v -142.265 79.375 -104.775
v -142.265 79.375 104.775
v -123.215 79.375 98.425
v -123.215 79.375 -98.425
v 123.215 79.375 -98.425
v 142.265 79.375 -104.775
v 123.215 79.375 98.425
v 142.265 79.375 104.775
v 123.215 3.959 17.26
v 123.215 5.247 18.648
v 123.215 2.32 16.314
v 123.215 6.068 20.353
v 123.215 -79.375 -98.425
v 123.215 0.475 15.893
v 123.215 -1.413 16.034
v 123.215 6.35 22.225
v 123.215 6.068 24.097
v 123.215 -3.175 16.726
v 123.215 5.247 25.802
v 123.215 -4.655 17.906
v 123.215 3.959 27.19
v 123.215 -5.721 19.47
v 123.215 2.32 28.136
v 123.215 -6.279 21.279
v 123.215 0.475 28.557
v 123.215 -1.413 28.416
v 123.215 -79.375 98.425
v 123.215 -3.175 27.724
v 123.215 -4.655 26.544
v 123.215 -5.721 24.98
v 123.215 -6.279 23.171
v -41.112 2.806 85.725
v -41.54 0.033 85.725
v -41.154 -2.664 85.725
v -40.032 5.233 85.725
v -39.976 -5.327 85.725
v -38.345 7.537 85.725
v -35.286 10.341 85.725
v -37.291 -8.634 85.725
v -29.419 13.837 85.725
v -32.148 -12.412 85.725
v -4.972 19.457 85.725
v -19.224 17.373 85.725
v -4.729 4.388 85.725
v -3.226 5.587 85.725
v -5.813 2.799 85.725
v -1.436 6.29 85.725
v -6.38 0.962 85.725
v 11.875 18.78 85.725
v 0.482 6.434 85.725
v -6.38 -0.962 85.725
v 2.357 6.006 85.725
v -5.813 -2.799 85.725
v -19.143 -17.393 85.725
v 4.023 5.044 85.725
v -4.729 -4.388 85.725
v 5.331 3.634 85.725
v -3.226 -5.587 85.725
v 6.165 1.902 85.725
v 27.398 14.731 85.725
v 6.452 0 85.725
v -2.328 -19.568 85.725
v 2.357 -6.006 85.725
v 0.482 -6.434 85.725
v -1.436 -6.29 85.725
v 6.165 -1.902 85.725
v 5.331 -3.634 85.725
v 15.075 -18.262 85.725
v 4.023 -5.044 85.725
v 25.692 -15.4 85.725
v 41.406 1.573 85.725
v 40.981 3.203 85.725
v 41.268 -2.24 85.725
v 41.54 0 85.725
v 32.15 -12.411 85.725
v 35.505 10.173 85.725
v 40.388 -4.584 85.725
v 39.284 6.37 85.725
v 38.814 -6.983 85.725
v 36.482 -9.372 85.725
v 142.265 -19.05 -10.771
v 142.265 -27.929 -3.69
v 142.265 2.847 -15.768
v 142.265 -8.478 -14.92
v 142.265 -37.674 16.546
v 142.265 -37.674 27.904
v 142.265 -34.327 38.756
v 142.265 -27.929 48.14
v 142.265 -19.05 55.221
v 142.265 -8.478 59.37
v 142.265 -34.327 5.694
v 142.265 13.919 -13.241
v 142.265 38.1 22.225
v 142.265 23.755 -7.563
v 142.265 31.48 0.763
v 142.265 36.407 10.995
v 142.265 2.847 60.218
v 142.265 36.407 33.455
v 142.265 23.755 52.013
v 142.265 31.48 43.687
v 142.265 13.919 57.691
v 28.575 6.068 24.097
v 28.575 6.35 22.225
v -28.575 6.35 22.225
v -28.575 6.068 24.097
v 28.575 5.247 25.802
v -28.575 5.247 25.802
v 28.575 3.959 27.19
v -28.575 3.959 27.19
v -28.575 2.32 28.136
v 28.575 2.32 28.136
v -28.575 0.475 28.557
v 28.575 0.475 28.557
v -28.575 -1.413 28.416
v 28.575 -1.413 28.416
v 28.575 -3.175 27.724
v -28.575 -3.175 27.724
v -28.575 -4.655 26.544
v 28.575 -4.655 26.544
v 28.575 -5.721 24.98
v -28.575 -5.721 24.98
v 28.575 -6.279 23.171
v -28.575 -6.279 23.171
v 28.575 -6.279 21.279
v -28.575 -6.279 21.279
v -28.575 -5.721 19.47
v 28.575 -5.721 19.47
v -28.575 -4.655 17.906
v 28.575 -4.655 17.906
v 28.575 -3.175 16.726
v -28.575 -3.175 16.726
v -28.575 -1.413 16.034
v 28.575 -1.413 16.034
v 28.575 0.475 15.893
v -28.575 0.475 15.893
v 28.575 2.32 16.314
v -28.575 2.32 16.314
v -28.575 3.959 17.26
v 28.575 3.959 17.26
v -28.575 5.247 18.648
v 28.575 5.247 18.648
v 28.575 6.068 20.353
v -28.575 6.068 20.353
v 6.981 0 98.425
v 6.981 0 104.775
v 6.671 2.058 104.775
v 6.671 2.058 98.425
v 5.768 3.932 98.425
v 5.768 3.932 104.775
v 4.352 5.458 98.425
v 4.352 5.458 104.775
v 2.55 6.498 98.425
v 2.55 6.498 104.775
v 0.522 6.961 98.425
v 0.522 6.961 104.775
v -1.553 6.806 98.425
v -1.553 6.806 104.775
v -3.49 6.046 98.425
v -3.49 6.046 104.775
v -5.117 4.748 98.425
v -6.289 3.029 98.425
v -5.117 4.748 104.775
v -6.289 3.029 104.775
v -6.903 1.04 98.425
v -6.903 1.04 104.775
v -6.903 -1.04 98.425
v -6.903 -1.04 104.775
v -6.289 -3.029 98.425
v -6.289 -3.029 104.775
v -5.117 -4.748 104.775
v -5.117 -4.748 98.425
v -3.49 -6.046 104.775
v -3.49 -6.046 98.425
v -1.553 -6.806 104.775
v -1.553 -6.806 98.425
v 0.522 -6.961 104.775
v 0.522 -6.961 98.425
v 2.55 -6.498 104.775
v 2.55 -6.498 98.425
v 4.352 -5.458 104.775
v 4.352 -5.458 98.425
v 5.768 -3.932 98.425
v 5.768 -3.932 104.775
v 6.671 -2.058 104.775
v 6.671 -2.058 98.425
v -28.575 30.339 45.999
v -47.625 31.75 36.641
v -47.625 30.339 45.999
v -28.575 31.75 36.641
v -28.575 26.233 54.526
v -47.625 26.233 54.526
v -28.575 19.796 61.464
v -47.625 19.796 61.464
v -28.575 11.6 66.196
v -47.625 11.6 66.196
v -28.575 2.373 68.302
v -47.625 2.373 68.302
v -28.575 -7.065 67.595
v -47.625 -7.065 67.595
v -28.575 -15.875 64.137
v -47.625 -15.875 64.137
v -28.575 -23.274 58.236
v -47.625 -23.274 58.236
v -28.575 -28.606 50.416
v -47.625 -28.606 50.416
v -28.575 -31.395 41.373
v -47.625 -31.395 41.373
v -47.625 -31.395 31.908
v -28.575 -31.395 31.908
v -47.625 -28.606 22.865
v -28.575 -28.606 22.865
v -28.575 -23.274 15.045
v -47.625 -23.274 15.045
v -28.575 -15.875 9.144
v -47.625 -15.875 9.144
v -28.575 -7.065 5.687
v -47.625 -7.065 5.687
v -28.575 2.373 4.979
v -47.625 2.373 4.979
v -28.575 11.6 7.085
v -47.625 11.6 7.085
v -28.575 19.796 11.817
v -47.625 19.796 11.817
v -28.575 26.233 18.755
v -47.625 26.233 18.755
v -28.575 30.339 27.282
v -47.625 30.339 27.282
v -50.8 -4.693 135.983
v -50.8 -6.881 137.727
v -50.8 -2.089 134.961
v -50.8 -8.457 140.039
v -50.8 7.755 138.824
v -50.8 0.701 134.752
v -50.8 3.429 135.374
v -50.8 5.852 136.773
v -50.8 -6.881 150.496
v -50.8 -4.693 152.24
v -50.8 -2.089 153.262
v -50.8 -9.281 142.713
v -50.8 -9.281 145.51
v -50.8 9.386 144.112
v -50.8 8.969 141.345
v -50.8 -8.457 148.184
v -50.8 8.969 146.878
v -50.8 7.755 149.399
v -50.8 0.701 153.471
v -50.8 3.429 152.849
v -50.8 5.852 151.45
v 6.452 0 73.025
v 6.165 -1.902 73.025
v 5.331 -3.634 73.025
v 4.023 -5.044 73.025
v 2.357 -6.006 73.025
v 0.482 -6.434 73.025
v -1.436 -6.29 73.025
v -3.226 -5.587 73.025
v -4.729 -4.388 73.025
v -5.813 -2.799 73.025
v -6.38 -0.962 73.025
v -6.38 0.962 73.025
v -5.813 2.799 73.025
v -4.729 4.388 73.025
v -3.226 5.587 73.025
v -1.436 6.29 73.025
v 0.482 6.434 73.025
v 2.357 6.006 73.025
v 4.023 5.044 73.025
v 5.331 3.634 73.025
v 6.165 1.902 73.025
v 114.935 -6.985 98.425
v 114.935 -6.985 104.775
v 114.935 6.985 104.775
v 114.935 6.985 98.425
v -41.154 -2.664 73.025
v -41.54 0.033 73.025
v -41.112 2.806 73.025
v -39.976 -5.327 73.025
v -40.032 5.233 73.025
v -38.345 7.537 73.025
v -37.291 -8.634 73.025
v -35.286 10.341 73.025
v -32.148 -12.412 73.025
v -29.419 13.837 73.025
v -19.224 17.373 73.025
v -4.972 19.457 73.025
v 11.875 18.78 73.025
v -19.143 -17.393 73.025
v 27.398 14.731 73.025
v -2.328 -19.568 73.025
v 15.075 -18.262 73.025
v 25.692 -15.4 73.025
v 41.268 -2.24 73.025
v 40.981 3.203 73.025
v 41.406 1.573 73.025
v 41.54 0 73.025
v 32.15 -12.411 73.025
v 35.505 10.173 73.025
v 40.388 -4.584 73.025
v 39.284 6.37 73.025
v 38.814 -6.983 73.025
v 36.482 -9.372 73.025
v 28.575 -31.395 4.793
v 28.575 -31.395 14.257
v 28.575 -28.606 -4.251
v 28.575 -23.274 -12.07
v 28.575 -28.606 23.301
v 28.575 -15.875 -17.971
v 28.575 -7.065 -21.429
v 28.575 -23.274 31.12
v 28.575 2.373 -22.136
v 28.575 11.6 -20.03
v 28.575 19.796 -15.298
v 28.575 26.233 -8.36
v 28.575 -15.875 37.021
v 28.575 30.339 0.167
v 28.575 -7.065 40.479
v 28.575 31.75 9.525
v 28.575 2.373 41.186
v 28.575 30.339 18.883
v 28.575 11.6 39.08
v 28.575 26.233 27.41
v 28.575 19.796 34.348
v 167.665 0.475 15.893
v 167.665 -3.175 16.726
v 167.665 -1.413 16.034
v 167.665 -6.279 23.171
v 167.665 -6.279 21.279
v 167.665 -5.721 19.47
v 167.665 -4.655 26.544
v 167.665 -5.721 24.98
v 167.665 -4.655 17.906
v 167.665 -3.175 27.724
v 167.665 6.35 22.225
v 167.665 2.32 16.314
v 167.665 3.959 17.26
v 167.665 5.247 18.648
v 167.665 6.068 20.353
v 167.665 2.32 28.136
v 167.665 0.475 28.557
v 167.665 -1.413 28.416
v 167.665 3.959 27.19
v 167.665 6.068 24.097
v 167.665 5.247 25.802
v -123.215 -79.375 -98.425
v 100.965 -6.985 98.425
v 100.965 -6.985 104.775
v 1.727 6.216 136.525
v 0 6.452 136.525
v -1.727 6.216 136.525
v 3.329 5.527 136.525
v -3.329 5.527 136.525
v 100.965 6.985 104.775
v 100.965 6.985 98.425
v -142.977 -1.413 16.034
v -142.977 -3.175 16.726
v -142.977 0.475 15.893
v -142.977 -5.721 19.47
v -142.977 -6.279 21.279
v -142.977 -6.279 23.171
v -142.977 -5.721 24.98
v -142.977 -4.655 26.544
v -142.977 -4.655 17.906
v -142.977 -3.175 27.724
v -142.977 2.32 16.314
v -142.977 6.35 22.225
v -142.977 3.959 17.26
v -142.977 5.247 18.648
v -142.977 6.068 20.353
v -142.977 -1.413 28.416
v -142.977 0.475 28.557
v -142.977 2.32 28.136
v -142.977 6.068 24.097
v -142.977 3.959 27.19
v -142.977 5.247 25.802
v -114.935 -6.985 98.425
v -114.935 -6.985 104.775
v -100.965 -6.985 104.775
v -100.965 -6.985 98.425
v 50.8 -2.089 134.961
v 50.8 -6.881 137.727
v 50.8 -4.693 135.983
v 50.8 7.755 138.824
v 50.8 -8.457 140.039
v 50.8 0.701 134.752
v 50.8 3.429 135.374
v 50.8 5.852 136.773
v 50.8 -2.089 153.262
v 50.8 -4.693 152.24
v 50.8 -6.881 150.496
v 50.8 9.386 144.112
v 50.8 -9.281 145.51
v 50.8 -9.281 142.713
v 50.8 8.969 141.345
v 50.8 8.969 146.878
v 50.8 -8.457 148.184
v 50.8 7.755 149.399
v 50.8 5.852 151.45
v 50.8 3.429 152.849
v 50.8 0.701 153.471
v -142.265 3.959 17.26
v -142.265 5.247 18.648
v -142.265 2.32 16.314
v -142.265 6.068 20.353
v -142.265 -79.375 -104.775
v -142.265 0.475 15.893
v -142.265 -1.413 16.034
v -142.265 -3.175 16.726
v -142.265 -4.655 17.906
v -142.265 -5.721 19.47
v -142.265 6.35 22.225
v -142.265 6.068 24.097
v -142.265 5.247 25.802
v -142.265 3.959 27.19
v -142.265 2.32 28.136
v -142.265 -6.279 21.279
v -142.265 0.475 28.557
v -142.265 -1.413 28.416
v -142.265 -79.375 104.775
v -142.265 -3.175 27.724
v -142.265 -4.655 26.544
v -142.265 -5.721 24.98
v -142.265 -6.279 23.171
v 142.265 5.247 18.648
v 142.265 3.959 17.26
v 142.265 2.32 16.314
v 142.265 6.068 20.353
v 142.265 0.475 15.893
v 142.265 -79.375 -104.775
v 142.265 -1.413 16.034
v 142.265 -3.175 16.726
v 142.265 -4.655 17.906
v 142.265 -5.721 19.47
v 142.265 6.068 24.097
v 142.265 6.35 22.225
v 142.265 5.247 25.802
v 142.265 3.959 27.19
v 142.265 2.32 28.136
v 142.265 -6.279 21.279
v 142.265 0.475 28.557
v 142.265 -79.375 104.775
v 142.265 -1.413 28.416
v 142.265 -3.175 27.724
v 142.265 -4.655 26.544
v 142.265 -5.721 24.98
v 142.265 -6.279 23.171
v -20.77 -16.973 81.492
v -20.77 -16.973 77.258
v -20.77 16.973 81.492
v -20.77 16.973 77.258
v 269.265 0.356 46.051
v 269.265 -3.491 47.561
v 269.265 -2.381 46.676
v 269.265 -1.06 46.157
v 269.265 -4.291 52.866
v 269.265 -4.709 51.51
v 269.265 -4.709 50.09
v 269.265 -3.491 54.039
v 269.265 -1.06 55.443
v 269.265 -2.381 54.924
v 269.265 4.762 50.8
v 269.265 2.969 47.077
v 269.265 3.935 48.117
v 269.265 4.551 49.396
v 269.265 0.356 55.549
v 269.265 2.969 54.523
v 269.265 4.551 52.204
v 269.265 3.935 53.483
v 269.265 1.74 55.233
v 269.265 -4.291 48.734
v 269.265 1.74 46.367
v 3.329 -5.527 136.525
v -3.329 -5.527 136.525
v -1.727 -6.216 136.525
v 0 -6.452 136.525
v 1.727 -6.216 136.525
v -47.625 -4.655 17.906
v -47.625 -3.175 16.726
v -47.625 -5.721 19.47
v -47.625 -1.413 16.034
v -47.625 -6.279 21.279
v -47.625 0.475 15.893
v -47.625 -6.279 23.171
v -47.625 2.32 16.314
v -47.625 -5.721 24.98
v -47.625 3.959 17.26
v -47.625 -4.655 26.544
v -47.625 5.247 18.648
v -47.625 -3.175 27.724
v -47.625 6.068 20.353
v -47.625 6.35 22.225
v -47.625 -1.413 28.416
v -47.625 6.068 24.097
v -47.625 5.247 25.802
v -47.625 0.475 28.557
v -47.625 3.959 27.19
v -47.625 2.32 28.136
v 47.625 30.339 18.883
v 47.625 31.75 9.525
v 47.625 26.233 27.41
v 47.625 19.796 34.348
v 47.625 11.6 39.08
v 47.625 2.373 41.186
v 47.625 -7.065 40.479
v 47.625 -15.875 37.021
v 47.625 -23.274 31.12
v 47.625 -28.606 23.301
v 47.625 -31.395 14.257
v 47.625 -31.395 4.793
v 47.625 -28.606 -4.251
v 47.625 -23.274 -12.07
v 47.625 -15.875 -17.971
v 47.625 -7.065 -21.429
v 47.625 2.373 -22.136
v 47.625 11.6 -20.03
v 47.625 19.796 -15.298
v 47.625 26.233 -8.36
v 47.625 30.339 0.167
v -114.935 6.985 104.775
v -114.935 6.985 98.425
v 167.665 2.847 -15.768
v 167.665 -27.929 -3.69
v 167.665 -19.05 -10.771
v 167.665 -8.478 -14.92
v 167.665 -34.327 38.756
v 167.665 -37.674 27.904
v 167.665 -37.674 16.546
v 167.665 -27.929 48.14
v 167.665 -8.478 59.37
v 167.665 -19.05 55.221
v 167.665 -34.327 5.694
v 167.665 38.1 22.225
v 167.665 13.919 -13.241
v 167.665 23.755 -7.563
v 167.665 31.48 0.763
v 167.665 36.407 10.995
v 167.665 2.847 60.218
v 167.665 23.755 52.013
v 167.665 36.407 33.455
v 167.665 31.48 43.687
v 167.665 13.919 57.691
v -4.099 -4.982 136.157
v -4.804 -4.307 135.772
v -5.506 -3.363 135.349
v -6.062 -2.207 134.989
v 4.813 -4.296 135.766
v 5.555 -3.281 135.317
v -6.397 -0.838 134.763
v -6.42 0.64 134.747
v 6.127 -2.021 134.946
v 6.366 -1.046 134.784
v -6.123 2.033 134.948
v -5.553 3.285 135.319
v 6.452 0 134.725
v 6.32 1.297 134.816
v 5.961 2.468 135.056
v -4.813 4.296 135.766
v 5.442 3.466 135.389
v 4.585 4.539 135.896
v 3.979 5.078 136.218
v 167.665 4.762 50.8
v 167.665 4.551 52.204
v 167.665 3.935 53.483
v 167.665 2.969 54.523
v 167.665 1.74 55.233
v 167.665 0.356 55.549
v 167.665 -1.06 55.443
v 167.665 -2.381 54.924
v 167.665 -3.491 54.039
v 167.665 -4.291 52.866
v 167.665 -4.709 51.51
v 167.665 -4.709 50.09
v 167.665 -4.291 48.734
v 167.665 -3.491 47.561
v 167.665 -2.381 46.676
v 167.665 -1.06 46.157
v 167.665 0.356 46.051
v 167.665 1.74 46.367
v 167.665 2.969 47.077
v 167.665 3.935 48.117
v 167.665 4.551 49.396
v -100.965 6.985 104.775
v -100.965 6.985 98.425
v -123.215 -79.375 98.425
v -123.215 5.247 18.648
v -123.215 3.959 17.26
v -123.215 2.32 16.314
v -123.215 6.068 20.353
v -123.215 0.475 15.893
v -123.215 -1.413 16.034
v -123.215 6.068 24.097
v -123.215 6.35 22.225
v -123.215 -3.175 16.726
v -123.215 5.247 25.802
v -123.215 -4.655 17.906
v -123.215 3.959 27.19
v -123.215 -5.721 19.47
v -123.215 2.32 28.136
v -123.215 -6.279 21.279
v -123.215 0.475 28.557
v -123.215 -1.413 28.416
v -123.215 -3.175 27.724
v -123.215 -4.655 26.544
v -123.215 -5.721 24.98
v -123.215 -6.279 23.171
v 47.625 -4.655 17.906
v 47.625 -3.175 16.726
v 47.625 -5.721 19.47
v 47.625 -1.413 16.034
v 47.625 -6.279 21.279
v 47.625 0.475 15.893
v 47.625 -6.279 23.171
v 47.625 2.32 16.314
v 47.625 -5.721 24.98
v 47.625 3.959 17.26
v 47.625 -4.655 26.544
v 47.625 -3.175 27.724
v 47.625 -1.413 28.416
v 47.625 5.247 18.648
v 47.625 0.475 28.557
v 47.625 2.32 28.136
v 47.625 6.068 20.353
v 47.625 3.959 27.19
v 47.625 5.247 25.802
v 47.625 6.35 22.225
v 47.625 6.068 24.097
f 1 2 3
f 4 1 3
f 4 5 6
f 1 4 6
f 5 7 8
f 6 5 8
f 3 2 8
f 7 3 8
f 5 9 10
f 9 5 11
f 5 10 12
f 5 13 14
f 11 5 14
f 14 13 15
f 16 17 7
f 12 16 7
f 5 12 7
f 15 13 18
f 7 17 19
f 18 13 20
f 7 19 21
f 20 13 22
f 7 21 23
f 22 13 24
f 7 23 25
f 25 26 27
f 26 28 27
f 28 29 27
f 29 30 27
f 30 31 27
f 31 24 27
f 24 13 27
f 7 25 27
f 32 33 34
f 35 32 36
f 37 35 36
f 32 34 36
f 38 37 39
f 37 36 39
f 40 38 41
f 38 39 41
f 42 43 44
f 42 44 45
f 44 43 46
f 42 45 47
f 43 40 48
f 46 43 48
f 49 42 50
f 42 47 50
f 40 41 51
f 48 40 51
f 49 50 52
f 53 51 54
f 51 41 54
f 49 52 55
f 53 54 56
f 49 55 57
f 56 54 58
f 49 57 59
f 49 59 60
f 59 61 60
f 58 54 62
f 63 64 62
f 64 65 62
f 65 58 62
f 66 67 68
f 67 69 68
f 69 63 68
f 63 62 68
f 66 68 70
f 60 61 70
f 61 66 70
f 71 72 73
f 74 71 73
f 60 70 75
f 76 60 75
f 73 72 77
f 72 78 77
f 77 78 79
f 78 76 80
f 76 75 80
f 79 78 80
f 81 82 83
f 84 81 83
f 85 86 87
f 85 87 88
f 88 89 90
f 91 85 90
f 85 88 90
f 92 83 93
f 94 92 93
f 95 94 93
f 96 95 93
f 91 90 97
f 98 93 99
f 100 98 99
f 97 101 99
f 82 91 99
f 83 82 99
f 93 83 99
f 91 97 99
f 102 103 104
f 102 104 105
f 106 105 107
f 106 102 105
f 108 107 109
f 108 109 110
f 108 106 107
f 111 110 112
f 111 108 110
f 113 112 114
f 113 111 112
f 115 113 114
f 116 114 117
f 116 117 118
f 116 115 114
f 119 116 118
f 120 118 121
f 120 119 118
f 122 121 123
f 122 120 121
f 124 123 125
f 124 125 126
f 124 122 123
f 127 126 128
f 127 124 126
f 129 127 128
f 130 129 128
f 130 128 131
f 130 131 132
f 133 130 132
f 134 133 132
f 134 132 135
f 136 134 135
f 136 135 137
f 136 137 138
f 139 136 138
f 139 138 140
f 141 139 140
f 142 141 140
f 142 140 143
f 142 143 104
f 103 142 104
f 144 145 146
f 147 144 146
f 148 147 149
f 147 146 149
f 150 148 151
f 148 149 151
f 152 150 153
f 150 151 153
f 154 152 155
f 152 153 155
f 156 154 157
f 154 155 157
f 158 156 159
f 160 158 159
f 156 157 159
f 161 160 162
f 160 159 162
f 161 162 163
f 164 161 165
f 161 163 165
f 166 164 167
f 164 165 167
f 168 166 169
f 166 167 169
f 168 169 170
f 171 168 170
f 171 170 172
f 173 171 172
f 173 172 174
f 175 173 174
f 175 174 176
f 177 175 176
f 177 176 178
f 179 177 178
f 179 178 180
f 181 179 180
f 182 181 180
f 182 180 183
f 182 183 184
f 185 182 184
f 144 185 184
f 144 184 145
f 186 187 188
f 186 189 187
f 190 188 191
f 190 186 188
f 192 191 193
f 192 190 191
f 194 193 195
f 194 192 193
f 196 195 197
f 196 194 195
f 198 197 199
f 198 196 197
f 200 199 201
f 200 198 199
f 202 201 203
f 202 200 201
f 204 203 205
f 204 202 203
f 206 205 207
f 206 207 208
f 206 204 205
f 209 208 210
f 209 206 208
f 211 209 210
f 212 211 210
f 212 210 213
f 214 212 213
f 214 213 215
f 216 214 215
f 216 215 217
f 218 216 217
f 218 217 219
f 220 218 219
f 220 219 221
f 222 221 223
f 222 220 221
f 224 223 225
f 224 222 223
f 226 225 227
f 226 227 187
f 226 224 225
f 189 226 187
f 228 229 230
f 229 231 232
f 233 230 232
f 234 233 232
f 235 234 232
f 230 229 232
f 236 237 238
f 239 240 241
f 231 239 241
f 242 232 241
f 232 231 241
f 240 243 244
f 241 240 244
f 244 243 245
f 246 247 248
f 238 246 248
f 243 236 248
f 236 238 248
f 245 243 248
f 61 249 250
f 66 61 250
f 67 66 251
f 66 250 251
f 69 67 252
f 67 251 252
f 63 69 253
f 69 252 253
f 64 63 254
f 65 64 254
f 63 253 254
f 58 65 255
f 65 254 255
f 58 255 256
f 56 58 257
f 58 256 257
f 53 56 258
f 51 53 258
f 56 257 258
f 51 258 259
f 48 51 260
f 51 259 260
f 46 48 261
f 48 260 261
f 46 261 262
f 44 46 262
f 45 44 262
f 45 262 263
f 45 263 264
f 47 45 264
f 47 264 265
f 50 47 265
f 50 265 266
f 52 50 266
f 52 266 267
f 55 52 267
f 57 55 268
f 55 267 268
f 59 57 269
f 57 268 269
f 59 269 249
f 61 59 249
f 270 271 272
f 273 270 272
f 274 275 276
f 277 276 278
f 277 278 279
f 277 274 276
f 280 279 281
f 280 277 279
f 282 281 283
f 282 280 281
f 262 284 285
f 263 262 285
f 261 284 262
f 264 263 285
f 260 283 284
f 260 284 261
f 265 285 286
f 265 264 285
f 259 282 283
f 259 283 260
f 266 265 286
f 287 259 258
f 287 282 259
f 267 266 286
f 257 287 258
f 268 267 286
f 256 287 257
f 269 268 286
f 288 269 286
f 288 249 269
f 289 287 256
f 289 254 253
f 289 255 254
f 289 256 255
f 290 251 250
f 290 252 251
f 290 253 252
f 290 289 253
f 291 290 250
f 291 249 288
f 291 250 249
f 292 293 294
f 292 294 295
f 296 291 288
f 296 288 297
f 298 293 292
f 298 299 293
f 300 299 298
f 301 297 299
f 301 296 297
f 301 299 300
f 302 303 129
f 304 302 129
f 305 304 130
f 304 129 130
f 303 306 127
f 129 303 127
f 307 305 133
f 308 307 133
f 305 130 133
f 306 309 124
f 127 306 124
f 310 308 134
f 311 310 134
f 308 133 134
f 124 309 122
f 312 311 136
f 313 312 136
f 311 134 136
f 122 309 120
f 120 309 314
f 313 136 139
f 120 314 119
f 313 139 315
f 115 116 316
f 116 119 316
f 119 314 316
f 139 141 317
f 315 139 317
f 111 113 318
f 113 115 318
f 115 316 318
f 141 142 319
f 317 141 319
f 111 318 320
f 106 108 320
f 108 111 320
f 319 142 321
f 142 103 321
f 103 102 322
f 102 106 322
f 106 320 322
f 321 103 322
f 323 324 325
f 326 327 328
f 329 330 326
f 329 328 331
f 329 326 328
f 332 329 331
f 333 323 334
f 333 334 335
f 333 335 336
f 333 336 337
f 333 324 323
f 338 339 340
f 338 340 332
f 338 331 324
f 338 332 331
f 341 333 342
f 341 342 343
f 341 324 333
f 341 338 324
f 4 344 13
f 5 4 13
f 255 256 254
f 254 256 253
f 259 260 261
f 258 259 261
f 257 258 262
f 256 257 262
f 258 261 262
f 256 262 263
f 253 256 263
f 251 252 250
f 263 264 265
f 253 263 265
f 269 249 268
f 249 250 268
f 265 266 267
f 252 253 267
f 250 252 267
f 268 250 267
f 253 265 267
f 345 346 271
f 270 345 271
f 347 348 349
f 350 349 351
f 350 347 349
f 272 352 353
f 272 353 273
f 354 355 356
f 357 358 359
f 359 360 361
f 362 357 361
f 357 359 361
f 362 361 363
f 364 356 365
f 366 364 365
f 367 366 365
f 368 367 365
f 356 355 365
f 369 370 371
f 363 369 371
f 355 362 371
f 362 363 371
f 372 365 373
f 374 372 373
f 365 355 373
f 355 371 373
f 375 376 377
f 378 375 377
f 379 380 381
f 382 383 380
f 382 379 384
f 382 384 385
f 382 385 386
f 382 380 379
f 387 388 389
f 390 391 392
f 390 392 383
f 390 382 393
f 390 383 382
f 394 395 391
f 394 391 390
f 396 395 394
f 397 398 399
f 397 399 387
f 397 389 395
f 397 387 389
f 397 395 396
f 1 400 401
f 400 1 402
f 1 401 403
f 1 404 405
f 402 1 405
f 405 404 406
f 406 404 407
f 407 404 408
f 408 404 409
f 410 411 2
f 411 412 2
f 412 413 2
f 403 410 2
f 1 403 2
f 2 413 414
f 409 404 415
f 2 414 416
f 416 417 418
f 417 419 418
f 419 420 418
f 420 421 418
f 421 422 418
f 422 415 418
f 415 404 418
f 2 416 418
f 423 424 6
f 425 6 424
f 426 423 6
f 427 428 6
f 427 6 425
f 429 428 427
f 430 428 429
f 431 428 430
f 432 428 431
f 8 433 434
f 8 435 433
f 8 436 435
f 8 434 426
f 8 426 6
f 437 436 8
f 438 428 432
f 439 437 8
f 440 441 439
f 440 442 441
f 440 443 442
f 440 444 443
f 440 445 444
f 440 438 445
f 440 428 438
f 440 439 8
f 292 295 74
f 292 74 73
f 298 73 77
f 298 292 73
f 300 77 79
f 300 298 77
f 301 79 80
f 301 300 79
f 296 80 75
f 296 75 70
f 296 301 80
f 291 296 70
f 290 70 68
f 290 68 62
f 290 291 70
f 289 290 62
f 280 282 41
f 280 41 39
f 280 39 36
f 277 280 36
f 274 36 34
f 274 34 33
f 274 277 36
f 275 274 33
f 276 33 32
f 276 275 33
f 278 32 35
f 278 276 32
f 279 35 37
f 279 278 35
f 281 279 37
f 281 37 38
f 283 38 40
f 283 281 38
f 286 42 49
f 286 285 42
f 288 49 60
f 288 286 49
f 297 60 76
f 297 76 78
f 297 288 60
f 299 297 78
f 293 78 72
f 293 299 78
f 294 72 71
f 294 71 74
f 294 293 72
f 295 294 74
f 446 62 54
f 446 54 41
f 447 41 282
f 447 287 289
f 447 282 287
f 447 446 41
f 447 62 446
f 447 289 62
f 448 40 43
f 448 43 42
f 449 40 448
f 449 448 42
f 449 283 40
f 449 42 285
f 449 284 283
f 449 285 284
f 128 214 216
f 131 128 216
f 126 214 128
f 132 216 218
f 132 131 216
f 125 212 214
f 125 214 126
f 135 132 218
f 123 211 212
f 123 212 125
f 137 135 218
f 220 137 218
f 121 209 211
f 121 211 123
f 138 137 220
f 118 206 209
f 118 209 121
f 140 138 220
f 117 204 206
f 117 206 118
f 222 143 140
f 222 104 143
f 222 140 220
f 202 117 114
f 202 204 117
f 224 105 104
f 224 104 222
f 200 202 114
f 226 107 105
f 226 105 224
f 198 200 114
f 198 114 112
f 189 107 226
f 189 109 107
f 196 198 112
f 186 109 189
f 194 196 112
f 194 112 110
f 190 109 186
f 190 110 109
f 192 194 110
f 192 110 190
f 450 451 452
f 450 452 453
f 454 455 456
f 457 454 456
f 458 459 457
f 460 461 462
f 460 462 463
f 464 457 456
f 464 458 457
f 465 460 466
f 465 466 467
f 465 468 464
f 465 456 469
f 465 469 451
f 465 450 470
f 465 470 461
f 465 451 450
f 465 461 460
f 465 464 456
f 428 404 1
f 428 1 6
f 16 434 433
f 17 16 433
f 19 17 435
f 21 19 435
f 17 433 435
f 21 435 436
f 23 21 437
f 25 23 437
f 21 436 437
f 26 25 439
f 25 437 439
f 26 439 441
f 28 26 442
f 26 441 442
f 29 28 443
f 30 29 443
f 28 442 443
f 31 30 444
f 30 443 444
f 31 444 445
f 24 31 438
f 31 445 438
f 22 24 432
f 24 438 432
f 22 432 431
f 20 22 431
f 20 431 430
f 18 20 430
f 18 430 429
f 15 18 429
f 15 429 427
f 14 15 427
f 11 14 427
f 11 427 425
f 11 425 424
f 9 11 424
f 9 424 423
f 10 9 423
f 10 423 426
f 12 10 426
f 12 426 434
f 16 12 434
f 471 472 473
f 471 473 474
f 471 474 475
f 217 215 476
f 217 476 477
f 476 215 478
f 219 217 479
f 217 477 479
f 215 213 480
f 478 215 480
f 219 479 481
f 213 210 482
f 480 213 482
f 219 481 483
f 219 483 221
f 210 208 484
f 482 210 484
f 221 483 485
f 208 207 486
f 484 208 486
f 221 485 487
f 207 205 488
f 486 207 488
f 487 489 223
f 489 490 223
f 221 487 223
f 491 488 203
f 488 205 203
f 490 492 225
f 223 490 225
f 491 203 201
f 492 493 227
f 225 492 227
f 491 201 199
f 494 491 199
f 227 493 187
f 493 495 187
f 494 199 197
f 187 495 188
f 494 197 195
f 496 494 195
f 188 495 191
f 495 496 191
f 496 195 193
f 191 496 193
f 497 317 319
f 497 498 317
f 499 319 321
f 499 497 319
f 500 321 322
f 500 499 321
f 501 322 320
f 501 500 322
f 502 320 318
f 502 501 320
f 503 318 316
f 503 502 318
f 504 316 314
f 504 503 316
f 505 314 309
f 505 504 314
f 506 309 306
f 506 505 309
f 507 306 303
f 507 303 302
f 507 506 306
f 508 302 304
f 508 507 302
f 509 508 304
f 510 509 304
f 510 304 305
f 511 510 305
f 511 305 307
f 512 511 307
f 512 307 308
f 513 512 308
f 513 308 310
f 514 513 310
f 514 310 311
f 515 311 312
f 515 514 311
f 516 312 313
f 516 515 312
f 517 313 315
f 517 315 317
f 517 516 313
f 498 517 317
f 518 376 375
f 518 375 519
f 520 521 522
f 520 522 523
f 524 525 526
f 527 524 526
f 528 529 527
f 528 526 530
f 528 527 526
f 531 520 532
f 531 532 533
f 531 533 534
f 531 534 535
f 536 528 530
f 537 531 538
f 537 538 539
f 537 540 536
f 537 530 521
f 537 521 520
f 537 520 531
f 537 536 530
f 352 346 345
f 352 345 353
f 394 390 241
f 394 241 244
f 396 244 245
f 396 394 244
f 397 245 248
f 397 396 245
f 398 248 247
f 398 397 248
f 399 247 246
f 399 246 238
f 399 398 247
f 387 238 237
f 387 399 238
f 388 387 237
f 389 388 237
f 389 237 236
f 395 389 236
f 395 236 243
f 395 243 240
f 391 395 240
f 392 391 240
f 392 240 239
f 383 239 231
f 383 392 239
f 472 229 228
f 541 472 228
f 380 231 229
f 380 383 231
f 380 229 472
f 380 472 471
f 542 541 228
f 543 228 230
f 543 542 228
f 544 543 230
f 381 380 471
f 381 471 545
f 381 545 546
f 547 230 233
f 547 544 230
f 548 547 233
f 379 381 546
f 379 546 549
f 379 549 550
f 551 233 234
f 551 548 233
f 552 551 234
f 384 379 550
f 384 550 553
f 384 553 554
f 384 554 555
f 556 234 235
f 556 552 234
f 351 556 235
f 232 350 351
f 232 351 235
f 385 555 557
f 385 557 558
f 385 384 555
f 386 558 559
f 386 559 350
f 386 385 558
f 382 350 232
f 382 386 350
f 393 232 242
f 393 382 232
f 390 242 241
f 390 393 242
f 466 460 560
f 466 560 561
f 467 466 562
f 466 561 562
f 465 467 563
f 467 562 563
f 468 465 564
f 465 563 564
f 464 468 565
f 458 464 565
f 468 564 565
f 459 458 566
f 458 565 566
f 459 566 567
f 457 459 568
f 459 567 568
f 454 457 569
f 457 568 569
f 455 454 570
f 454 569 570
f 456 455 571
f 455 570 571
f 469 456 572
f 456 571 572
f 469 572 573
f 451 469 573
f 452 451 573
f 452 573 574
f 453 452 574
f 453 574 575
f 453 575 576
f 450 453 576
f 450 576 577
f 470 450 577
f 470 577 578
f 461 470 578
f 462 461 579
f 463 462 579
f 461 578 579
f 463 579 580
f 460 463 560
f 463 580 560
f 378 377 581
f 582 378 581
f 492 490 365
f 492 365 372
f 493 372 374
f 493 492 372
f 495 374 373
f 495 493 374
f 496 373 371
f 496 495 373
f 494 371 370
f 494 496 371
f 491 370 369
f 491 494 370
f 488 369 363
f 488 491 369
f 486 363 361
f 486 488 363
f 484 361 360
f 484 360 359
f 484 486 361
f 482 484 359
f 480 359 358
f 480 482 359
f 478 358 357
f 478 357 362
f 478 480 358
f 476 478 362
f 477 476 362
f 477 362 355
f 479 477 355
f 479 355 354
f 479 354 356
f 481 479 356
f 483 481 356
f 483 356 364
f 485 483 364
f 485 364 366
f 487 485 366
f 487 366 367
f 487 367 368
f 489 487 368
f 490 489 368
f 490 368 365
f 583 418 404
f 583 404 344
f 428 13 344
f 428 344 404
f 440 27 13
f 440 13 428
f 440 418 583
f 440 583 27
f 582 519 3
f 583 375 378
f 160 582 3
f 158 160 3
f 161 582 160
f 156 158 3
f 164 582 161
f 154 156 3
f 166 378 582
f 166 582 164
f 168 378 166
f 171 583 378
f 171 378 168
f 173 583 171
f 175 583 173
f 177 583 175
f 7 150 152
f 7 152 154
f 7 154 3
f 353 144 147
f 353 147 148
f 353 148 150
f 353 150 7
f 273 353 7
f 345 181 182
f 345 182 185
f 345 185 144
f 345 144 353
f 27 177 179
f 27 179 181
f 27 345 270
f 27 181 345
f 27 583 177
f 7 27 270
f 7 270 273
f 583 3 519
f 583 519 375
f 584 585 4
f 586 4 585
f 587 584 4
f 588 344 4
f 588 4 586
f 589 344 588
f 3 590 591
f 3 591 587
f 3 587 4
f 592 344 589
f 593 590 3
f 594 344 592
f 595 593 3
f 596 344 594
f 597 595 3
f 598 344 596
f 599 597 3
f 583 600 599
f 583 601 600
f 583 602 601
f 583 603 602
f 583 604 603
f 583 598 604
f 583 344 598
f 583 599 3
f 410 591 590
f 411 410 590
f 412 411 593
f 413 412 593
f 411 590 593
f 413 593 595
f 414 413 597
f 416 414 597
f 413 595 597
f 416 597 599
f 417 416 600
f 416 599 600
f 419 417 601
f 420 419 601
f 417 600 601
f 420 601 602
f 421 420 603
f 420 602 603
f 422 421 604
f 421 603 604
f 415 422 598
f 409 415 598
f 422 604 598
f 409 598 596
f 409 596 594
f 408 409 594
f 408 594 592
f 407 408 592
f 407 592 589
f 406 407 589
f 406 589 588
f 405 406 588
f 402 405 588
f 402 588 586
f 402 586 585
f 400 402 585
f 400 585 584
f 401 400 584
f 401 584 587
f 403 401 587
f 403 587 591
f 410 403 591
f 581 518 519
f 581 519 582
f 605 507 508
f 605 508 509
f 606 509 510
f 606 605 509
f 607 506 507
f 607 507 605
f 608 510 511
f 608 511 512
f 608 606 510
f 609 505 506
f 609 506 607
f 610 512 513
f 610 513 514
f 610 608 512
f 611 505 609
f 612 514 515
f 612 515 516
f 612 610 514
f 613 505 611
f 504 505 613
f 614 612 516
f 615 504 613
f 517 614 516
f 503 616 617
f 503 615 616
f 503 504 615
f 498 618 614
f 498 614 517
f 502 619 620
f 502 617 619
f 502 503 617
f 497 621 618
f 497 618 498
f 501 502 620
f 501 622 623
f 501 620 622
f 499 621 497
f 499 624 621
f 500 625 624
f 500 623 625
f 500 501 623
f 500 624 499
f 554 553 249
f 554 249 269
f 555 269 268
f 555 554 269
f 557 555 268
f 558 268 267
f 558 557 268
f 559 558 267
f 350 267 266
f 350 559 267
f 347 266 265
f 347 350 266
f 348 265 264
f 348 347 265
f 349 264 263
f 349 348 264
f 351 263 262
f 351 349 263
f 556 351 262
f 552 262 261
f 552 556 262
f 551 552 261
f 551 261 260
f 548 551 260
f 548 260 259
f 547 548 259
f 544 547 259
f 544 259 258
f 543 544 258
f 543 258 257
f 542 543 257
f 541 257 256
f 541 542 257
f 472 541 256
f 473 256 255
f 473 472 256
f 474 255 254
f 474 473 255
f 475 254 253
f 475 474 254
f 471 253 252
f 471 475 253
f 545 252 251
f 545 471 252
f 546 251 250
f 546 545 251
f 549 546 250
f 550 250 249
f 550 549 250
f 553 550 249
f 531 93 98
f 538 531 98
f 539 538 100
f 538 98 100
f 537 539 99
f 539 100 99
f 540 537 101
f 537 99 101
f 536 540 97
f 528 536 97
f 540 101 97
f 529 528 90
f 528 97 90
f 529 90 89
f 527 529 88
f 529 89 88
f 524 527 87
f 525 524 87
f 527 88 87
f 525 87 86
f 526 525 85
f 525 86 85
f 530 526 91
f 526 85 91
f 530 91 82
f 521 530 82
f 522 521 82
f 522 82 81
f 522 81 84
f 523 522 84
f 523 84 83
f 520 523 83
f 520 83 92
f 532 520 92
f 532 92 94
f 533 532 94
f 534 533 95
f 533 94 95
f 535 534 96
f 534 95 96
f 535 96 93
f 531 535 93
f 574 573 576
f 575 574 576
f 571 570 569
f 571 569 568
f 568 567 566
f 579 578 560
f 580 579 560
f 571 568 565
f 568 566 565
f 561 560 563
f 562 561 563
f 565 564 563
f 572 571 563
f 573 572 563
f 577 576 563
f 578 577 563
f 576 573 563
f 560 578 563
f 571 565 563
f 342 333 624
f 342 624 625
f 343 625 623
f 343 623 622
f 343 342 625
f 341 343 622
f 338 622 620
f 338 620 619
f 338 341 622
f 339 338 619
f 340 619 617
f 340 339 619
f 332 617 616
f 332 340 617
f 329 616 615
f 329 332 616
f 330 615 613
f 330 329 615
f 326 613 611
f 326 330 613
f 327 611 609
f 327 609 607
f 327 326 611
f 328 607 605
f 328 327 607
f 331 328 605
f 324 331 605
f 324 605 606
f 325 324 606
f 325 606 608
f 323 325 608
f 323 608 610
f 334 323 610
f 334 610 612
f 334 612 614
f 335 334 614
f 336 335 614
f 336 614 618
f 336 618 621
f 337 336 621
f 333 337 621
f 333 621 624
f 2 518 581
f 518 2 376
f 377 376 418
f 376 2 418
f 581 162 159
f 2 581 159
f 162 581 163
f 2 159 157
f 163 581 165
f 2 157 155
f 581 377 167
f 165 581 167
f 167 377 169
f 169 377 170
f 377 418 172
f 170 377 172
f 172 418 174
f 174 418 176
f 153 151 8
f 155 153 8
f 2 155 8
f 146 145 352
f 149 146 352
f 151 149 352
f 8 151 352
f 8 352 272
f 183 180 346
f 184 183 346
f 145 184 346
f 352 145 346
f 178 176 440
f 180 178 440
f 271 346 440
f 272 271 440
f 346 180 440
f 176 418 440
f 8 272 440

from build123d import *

# Parameters (mm, degrees)
F0_W      = 284.5298647881
F0_H      = 209.55
F0_W_2    = 246.4298647881
F0_H_2    = 196.85
F1_DEPTH  = 79.375
F2_R      = 38.1
F3_DEPTH  = 25.4
F4_R      = 4.7625
F5_DEPTH  = 101.6
F6_R      = 6.35
F7_DEPTH  = 284.5308647881
F8_R      = 6.35
F9_DEPTH  = 310.642
F10_R     = 6.9807457545
F11_DEPTH = 25.4
F14_R     = 6.4516
F15_DEPTH = 31.75
F16_R     = 6.4516
F17_DEPTH = 12.7
F18_R     = 31.75
F18_R_2   = 6.35
F19_DEPTH = 9.525
F20_R     = 31.75
F20_R_2   = 6.35
F21_DEPTH = 9.525
F22_W     = 13.97
F22_H     = 13.97
F23_DEPTH = 38.1
F24_R     = 9.3861059633
F25_DEPTH = 50.8


with BuildPart() as f1:
    # F0 (on Front) → F1 (new body, symmetric)
    with BuildSketch(Plane.XZ):
        Rectangle(F0_W, F0_H)
        Rectangle(F0_W_2, F0_H_2, mode=Mode.SUBTRACT)
    extrude(amount=F1_DEPTH, both=True)

    # F6 (on face) → F7 (cut, through all)
    with BuildSketch(Plane.YZ.offset(142.264932394)):
        with Locations((0, 22.225)):
            Circle(F6_R)
    extrude(amount=-F7_DEPTH, mode=Mode.SUBTRACT)

    # F10 (on face) → F11 (cut)
    with BuildSketch(Plane.XY.offset(104.775)):
        Circle(F10_R)
    extrude(amount=-F11_DEPTH, mode=Mode.SUBTRACT)

    # F22 (on face) → F23 (cut)
    with BuildSketch(Plane.XY.offset(104.775)):
        with Locations((-107.95, 0)):
            Rectangle(F22_W, F22_H)
        with Locations((107.95, 0)):
            Rectangle(F22_W, F22_H)
    extrude(amount=-F23_DEPTH, mode=Mode.SUBTRACT)


with BuildPart() as f3:
    # F2 (on face) → F3 (new body)
    with BuildSketch(Plane.YZ.offset(142.264932394)):
        with Locations((0, 22.225)):
            Circle(F2_R)
    extrude(amount=F3_DEPTH)


with BuildPart() as f5:
    # F4 (on face) → F5 (new body)
    with BuildSketch(Plane.YZ.offset(167.664932394)):
        with Locations((0, 50.8)):
            Circle(F4_R)
    extrude(amount=F5_DEPTH)


with BuildPart() as f9:
    # F8 (on face) → F9 (new body)
    with BuildSketch(Plane.YZ.offset(167.664932394)):
        with Locations((0, 22.225)):
            Circle(F8_R)
    extrude(amount=-F9_DEPTH)

    # F18 (on offset) → F19 (join, symmetric)
    with BuildSketch(Plane.YZ.offset(38.1)):
        with Locations((0, 9.525)):
            Circle(F18_R)
        with Locations((0, 22.225)):
            Circle(F18_R_2, mode=Mode.SUBTRACT)
    extrude(amount=F19_DEPTH, both=True)

    # F20 (on offset) → F21 (join, symmetric)
    with BuildSketch(Plane.YZ.offset(-38.1)):
        with Locations((0, 36.6405477102)):
            Circle(F20_R)
        with Locations((0, 22.225)):
            Circle(F20_R_2, mode=Mode.SUBTRACT)
    extrude(amount=F21_DEPTH, both=True)


with BuildPart() as f15:
    # F14 (on face) → F15 (new body, symmetric)
    with BuildSketch(Plane.XY.offset(104.775)):
        Circle(F14_R)
    extrude(amount=F15_DEPTH, both=True)

    # F24 (on Right) → F25 (join, symmetric)
    with BuildSketch(Plane.YZ):
        with Locations((0, 144.1115438938)):
            Circle(F24_R)
    extrude(amount=F25_DEPTH, both=True)


with BuildPart() as f17:
    # F16 (on face) → F17 (new body)
    with BuildSketch(Plane(origin=(0, 0, 73.025), x_dir=(1, 0, 0), z_dir=(0, 0, -1))):
        with BuildLine():
            add(Edge.make_bspline(
                [(41.5398068726, 0), (41.5398068726, 33.9453180526), (-20.7699034363, 16.9726590263), (-83.0796137452, 0), (-20.7699034363, -16.9726590263), (41.5398068726, -33.9453180526), (41.5398068726, 0)],
                knots=[0, 0, 0, 2.0943951024, 2.0943951024, 4.1887902048, 4.1887902048, 6.2831853072, 6.2831853072, 6.2831853072], degree=2, weights=[1, 0.5, 1, 0.5, 1, 0.5, 1]))
        make_face()
        Circle(F16_R, mode=Mode.SUBTRACT)
    extrude(amount=-F17_DEPTH)


solid = Compound([f1.part, f3.part, f5.part, f9.part, f15.part, f17.part])
